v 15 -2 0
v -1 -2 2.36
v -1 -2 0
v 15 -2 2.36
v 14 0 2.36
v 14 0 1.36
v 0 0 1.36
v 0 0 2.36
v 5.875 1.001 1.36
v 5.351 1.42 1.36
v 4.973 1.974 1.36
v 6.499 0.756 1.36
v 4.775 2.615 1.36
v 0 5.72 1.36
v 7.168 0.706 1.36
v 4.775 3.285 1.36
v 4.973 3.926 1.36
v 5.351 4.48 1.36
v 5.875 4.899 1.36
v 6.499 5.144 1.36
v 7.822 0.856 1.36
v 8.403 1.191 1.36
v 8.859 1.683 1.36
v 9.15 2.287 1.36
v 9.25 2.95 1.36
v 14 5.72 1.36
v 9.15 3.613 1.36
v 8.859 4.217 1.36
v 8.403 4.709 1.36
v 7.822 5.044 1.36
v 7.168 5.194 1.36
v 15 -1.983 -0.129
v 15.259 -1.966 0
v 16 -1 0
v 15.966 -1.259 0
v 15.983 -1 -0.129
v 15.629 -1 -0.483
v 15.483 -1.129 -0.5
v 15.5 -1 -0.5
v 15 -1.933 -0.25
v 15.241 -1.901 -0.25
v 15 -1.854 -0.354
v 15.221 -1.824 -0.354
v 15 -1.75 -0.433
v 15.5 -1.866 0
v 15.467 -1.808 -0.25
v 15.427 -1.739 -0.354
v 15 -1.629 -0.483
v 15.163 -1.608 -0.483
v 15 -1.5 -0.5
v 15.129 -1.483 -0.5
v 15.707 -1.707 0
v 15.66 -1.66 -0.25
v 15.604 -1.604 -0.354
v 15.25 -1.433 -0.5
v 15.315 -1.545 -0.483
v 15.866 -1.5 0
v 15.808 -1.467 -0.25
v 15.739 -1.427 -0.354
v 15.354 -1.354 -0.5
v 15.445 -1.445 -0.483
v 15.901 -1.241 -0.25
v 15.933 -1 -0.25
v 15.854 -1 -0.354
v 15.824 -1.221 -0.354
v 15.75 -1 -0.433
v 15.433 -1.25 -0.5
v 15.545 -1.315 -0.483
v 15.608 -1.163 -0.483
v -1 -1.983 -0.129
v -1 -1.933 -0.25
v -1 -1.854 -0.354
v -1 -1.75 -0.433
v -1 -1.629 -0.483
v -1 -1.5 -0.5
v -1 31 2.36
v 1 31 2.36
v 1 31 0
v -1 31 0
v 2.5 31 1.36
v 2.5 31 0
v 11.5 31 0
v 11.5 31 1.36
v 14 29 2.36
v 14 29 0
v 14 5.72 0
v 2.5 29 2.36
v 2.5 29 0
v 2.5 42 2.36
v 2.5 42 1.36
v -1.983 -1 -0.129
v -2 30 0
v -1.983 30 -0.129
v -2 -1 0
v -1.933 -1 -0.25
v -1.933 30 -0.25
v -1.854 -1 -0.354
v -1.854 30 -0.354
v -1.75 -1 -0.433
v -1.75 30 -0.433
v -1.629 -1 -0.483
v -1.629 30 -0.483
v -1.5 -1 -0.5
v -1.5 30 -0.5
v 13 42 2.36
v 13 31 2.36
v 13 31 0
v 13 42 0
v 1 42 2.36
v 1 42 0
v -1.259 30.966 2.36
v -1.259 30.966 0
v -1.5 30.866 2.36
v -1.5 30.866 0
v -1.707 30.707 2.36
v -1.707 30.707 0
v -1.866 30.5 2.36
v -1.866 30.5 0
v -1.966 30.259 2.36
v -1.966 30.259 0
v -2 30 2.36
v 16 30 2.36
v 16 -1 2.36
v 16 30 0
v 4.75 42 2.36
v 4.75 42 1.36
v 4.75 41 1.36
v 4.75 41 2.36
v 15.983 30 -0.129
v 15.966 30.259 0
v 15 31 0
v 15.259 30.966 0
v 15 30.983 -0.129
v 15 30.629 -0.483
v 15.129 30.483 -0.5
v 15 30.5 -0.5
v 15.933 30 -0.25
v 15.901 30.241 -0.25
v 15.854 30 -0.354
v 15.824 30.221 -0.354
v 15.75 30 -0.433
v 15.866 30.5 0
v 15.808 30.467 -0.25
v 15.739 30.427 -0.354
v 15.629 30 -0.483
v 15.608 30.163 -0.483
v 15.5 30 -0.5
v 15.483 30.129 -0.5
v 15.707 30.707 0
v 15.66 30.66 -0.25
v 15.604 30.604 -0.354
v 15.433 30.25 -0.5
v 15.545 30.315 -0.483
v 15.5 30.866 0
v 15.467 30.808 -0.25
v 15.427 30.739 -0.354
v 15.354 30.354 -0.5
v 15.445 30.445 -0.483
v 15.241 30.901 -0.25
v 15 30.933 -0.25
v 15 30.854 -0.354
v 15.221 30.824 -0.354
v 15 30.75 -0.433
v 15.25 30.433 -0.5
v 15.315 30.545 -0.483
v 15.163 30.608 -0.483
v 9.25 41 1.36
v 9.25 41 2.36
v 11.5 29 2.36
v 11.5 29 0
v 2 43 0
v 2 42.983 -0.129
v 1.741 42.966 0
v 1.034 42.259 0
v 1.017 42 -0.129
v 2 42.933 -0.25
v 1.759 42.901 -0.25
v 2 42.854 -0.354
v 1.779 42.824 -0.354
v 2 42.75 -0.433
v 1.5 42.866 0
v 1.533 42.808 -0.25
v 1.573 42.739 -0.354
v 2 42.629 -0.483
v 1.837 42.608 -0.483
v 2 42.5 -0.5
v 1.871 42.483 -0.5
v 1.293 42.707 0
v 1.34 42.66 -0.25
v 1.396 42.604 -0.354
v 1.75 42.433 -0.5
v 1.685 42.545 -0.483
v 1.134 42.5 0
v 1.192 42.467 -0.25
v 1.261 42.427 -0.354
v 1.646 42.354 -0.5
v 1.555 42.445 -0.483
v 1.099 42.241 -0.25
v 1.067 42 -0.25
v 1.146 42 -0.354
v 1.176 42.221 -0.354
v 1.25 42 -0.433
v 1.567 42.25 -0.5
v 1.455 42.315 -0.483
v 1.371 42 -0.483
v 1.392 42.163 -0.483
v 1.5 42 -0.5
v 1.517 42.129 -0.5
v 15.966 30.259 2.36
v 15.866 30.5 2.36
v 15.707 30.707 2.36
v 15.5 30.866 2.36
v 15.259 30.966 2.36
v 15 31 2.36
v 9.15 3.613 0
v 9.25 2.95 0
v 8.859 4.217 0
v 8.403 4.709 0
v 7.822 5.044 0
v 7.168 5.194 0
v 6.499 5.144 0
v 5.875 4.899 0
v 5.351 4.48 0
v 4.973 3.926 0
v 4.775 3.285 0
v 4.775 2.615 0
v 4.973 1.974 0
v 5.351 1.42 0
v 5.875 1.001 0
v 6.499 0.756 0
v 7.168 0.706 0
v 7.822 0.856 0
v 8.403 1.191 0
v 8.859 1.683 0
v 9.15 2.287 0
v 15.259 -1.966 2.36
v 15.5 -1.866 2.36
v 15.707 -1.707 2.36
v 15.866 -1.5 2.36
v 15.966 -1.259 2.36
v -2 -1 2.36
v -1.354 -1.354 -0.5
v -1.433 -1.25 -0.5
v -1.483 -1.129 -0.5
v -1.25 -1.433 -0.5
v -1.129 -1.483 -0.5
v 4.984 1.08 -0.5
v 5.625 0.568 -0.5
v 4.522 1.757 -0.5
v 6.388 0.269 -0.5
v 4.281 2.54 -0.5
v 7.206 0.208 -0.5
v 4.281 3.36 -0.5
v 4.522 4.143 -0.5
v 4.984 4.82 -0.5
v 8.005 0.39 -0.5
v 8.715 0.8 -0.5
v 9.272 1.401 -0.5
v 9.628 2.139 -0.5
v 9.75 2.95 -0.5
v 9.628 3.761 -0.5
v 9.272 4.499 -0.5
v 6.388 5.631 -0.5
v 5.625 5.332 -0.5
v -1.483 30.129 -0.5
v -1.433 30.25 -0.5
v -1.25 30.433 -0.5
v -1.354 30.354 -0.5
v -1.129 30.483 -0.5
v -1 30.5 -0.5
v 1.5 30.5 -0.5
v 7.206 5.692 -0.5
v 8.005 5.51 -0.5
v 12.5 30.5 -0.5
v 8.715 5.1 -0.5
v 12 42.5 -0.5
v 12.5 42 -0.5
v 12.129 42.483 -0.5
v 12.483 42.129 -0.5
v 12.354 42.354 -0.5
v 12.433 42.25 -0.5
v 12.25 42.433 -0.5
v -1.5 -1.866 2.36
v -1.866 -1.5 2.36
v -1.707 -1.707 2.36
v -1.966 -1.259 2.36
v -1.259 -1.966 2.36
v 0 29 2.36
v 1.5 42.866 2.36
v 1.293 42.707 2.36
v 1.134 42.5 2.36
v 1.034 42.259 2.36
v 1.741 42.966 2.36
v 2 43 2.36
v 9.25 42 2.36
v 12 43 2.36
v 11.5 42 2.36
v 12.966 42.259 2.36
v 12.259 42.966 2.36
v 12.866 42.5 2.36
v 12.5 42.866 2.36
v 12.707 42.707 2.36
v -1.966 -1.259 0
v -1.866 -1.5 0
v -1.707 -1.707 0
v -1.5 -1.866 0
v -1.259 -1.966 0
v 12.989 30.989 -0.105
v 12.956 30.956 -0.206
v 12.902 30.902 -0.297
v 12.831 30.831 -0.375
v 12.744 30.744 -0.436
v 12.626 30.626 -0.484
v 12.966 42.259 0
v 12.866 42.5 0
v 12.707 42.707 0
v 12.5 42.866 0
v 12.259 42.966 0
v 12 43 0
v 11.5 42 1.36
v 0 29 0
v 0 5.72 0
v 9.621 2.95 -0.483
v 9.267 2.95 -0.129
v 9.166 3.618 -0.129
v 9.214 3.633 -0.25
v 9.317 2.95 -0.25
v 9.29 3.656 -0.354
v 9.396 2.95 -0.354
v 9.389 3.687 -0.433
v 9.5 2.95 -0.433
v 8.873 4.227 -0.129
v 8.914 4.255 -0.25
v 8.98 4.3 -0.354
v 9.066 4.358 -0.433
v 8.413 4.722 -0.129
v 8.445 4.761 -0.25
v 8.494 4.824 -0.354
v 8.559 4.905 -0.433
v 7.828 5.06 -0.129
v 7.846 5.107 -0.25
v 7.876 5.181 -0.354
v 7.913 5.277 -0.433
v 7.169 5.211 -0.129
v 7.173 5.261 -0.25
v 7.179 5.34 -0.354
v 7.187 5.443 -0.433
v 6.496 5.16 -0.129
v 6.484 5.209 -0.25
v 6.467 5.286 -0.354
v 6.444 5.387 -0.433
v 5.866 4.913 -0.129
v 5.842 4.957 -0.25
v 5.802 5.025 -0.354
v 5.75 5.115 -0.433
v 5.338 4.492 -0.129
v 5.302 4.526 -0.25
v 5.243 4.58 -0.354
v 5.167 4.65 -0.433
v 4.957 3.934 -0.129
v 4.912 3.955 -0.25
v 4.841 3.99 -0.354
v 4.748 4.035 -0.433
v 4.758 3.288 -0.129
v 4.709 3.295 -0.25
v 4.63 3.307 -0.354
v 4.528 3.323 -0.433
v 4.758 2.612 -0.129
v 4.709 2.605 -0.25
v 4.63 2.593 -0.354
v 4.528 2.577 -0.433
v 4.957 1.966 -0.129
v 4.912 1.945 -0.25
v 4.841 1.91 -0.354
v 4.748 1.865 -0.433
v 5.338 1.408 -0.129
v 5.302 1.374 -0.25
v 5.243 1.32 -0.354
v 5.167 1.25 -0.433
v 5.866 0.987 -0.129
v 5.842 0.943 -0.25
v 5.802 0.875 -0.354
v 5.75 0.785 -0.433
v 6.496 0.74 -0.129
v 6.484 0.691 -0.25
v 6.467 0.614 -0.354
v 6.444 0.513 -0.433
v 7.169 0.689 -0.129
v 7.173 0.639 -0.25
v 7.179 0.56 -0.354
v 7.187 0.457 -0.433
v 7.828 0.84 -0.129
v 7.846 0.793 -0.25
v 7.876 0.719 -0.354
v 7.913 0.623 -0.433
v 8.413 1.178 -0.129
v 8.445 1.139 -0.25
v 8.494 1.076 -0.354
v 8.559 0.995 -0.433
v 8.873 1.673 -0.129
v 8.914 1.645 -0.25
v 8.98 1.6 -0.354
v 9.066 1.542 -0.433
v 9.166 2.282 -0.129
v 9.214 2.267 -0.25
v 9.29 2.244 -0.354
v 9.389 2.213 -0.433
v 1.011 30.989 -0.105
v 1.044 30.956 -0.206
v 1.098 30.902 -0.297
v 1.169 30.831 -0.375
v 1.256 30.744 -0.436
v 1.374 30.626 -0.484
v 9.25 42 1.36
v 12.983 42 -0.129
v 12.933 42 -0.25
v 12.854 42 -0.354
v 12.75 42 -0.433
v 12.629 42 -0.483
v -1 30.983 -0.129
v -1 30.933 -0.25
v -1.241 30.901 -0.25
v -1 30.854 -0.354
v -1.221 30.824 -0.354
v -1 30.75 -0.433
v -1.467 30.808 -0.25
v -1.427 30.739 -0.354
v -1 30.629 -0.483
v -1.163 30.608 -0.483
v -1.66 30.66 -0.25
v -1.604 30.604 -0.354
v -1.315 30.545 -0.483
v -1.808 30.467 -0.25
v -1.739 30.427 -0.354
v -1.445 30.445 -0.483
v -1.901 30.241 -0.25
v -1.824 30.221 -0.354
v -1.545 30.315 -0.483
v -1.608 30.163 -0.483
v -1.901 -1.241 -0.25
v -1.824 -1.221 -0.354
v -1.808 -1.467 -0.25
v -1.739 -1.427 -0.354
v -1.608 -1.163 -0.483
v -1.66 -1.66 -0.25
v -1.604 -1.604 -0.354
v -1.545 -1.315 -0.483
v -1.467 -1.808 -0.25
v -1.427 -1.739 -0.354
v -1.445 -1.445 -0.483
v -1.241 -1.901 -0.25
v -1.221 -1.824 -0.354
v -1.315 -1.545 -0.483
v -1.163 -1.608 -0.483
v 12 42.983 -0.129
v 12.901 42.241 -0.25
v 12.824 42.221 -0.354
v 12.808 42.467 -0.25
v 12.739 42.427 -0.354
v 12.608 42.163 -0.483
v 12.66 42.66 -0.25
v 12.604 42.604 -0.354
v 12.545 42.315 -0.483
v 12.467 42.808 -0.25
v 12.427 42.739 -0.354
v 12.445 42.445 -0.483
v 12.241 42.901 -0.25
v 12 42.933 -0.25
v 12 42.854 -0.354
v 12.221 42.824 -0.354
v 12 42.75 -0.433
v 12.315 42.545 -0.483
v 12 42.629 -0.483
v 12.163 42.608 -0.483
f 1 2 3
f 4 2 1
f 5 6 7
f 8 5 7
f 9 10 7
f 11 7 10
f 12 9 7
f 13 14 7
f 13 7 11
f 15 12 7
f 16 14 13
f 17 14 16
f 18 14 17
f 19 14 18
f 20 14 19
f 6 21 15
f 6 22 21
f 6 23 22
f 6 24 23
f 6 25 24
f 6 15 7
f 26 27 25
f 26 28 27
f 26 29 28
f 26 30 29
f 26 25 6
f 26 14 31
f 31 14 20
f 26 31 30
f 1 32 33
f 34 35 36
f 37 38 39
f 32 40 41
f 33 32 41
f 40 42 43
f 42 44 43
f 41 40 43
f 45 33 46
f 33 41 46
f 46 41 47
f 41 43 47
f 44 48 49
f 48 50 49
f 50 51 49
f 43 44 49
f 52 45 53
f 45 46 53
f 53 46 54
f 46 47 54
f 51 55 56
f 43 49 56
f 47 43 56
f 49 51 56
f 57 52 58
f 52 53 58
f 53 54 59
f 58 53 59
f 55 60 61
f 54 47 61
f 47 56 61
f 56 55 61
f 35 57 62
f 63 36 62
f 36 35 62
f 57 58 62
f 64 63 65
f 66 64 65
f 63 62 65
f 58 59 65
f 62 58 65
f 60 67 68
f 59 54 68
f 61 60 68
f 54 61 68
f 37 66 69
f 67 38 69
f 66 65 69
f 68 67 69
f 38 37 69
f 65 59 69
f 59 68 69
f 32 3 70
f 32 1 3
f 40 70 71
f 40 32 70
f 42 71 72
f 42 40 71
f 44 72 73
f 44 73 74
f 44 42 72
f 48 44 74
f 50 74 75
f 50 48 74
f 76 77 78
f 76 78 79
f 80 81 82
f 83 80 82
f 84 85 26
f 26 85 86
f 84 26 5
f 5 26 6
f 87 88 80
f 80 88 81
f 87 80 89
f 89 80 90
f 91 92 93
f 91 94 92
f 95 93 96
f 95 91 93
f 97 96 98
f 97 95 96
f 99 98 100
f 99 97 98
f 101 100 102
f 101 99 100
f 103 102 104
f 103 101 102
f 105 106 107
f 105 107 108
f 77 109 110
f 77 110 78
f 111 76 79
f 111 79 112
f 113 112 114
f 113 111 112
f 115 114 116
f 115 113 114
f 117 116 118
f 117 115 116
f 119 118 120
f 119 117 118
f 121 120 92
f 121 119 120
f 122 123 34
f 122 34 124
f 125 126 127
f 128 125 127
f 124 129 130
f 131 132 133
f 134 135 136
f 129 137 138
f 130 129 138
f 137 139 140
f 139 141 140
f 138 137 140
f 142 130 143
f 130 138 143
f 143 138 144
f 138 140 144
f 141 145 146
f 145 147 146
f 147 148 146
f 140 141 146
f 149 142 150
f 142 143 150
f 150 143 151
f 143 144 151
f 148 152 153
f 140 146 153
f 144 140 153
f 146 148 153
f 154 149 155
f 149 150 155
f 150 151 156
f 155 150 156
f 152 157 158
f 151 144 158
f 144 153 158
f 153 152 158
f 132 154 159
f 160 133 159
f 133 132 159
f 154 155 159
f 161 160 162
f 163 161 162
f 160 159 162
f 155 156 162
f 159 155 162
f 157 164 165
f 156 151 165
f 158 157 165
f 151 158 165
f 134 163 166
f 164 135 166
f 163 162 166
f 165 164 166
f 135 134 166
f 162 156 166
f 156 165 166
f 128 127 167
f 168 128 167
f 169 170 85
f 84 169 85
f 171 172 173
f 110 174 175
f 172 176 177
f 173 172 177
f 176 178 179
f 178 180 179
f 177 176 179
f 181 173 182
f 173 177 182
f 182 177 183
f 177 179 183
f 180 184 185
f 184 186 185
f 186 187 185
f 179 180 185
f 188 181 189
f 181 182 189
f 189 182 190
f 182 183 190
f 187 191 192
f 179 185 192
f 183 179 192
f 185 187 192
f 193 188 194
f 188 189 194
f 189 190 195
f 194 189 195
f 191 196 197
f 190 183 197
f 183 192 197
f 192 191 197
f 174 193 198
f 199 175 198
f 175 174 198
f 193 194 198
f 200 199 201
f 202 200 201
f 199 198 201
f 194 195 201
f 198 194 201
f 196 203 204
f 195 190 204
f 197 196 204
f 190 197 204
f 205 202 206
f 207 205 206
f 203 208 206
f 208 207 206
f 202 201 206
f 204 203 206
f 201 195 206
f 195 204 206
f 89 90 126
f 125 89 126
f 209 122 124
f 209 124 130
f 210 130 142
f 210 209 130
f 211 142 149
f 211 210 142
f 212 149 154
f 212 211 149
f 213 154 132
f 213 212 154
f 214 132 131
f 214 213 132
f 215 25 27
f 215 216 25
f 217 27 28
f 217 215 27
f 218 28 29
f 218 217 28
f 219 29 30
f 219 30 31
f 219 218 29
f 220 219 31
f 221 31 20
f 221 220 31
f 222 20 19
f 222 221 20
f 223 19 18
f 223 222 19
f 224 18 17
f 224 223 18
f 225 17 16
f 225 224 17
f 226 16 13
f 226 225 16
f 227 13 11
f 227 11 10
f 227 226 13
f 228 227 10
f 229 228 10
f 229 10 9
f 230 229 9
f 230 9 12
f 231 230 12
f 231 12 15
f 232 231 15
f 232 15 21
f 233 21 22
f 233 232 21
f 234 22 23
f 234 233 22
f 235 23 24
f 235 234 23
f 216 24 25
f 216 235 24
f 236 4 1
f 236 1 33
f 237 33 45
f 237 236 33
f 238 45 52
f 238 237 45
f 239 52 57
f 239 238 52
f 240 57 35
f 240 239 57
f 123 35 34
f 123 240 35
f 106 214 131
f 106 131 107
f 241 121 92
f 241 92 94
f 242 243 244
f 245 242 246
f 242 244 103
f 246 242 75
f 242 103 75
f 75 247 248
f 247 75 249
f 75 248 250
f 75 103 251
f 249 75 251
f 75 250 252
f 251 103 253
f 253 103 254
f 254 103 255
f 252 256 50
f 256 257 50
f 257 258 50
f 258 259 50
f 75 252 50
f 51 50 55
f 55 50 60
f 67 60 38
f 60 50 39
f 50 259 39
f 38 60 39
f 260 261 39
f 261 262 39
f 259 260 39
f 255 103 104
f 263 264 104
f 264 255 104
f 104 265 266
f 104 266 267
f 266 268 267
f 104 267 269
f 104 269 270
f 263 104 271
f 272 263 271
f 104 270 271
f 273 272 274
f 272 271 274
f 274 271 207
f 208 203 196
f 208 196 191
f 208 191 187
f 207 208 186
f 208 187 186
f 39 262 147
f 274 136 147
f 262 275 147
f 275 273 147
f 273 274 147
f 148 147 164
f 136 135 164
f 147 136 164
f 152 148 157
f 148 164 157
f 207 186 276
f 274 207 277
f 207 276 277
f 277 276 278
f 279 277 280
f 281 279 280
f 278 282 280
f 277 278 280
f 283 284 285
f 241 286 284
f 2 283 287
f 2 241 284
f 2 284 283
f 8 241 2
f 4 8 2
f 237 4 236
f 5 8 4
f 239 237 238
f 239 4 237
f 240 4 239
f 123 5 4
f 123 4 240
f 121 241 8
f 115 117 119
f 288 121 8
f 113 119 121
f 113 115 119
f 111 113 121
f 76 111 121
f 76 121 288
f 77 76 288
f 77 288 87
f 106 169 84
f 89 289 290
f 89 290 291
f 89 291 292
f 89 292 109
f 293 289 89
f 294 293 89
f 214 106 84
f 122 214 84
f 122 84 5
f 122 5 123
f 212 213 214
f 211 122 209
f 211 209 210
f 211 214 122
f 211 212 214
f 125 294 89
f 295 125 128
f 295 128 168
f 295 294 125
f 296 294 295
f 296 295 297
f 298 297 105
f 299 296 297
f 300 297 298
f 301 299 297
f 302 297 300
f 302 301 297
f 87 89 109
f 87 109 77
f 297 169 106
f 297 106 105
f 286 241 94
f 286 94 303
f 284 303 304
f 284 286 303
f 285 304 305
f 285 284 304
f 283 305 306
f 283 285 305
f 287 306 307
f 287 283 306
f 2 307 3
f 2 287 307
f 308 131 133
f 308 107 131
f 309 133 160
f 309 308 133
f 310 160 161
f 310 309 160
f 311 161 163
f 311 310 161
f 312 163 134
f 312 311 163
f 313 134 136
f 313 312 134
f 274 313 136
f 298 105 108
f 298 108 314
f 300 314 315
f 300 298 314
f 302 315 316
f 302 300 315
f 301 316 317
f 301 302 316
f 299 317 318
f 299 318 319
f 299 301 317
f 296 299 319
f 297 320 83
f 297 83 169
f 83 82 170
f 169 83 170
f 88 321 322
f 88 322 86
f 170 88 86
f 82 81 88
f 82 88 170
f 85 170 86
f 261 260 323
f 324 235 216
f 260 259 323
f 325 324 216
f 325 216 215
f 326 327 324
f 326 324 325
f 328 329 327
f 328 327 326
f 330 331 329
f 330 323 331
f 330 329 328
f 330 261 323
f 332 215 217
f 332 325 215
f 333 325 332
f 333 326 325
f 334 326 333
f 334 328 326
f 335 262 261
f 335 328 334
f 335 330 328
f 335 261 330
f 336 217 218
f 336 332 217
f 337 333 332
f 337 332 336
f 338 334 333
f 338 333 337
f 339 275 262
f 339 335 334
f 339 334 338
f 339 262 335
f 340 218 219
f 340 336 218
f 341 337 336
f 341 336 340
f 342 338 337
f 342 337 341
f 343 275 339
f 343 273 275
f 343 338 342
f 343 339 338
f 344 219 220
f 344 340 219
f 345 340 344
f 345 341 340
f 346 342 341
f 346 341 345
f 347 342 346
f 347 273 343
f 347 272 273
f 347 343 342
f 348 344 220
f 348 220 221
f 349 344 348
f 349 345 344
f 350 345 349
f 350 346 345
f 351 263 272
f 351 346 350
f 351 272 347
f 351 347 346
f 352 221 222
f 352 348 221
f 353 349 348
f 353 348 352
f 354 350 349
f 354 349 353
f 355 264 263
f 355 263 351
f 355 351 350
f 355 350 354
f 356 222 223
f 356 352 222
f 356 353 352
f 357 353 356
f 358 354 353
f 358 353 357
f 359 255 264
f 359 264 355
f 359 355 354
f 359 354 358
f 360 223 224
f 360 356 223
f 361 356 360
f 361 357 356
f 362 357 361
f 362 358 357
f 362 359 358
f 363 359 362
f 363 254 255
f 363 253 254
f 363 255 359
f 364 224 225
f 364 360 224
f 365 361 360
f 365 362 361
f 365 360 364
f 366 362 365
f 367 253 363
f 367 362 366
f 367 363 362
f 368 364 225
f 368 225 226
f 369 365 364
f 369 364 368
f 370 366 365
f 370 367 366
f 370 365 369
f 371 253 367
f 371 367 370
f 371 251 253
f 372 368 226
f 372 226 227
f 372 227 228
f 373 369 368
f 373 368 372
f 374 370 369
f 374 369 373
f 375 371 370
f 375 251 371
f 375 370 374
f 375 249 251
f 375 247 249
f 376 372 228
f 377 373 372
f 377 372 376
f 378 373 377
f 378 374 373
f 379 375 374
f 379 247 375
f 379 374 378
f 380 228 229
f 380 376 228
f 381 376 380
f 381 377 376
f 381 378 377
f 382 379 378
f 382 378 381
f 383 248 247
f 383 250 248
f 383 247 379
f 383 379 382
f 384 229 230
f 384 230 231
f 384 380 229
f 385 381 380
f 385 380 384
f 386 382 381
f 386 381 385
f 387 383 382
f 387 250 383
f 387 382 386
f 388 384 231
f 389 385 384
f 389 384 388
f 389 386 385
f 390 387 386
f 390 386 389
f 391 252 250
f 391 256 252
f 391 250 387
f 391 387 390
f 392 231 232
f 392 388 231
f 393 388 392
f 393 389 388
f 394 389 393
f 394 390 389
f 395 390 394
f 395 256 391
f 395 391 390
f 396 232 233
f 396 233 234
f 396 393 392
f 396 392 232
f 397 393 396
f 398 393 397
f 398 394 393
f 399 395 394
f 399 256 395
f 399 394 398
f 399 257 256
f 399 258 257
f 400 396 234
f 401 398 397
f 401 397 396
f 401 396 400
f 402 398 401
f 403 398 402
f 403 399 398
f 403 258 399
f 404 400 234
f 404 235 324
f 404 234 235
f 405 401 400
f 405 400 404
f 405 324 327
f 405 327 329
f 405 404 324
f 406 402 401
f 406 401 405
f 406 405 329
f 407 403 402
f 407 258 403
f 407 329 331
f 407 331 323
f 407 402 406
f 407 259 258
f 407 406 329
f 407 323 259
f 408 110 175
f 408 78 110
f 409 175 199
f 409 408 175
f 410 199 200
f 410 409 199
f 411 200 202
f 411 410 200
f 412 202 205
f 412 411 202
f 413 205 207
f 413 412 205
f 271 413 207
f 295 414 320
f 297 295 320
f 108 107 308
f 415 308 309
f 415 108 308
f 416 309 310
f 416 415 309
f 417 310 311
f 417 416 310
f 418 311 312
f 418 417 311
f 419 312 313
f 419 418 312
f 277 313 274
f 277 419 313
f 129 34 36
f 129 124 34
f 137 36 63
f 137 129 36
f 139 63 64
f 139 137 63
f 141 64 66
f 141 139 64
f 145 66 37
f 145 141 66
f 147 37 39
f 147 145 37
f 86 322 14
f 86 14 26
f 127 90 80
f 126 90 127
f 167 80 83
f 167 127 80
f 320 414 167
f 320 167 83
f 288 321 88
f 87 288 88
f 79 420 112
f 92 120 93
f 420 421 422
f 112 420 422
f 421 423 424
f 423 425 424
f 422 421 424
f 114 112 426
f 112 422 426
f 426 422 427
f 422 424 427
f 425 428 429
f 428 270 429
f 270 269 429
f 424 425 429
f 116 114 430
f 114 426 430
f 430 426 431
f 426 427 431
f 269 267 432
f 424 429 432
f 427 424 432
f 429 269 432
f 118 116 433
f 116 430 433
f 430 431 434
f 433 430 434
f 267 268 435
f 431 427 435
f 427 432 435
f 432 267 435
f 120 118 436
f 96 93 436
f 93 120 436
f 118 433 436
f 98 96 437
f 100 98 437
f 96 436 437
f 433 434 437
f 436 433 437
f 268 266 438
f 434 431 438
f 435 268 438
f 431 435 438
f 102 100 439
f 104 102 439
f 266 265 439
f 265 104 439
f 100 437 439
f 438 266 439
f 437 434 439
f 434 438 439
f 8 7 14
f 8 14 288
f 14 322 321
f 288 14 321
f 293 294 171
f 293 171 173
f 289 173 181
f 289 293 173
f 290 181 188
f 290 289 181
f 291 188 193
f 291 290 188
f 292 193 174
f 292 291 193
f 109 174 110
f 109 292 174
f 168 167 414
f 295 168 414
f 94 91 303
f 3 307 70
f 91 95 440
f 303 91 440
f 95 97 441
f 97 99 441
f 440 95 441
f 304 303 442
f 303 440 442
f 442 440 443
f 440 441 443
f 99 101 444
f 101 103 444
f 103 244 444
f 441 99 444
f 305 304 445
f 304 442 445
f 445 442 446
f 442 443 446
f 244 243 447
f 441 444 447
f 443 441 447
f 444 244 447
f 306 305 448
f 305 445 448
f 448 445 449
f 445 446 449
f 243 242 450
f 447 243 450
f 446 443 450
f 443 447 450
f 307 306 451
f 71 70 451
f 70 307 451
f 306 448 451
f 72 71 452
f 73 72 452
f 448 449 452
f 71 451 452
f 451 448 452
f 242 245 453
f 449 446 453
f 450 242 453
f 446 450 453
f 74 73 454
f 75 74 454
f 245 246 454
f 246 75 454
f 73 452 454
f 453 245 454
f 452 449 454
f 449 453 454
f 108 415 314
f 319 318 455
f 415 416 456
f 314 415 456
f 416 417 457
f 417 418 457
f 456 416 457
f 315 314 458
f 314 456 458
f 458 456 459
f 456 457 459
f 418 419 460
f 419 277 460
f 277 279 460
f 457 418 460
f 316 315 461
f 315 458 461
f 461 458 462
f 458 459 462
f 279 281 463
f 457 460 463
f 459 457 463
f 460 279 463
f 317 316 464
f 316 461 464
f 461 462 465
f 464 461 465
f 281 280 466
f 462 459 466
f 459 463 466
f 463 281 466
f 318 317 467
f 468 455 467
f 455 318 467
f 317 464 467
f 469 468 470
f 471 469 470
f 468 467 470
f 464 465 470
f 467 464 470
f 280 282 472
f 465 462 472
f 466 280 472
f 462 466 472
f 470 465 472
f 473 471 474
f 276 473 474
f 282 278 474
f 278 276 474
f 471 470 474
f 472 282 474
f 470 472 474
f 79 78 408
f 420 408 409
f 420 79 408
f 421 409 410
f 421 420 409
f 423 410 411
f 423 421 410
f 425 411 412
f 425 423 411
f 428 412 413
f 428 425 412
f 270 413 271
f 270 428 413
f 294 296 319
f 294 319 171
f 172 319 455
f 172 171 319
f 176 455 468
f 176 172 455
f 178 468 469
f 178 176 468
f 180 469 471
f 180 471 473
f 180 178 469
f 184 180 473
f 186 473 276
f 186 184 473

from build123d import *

# Parameters (mm, degrees)
F1_DEPTH = 2.36
F0_W     = 14
F0_H     = 5.7202167809
F0_R     = 2.25
F0_R_2   = 4.5
F2_DEPTH = 0.5
F3_R     = 0.49999
F4_DEPTH = 1.36
F5_DEPTH = 1.36


# Not quite as in the source:
# - a fillet or chamfer is up to 0.001 mm smaller than in the source, because OpenCascade refuses the exact size


with BuildPart() as f1:
    # F0 (on Top) → F1 (new body)
    with BuildSketch(Plane.XY):
        with BuildLine():
            ThreePointArc((-2, -1), (-1.7071067812, -1.7071067812), (-1, -2))
            Line((-1, -2), (15, -2))
            ThreePointArc((15, -2), (15.7071067812, -1.7071067812), (16, -1))
            Line((16, -1), (16, 30))
            ThreePointArc((16, 30), (15.7071067812, 30.7071067812), (15, 31))
            Line((15, 31), (13, 31))
            Line((13, 31), (13, 42))
            ThreePointArc((13, 42), (12.7071067812, 42.7071067812), (12, 43))
            Line((12, 43), (2, 43))
            ThreePointArc((2, 43), (1.2928932188, 42.7071067812), (1, 42))
            Line((1, 42), (1, 31))
            Line((1, 31), (-1, 31))
            ThreePointArc((-1, 31), (-1.7071067812, 30.7071067812), (-2, 30))
            Line((-2, 30), (-2, -1))
        make_face()
        Polygon((14, 0), (0, 0), (0, 5.7202167809), (0, 29), (2.5, 29), (2.5, 31), (2.5, 42), (4.75, 42), (4.75, 41), (9.25, 41), (9.25, 42), (11.5, 42), (11.5, 31), (11.5, 29), (14, 29), (14, 5.7202167809), align=None, mode=Mode.SUBTRACT)
    extrude(amount=F1_DEPTH)

    # F0 (on Top) → F2 (join)
    with BuildSketch(Plane.XY):
        with BuildLine():
            ThreePointArc((-2, -1), (-1.7071067812, -1.7071067812), (-1, -2))
            Line((-1, -2), (15, -2))
            ThreePointArc((15, -2), (15.7071067812, -1.7071067812), (16, -1))
            Line((16, -1), (16, 30))
            ThreePointArc((16, 30), (15.7071067812, 30.7071067812), (15, 31))
            Line((15, 31), (13, 31))
            Line((13, 31), (13, 42))
            ThreePointArc((13, 42), (12.7071067812, 42.7071067812), (12, 43))
            Line((12, 43), (2, 43))
            ThreePointArc((2, 43), (1.2928932188, 42.7071067812), (1, 42))
            Line((1, 42), (1, 31))
            Line((1, 31), (-1, 31))
            ThreePointArc((-1, 31), (-1.7071067812, 30.7071067812), (-2, 30))
            Line((-2, 30), (-2, -1))
        make_face()
        Polygon((14, 0), (0, 0), (0, 5.7202167809), (0, 29), (2.5, 29), (2.5, 31), (2.5, 42), (4.75, 42), (4.75, 41), (9.25, 41), (9.25, 42), (11.5, 42), (11.5, 31), (11.5, 29), (14, 29), (14, 5.7202167809), align=None, mode=Mode.SUBTRACT)
        with Locations((7, 2.8601083905)):
            Rectangle(F0_W, F0_H)
        with Locations((7, 2.95)):
            Circle(F0_R, mode=Mode.SUBTRACT)
        Polygon((2.5, 42), (2.5, 31), (11.5, 31), (11.5, 42), (9.25, 42), (9.25, 41), (4.75, 41), (4.75, 42), align=None)
        Polygon((0, 29), (0, 5.7202167809), (14, 5.7202167809), (14, 29), (11.5, 29), (11.5, 31), (2.5, 31), (2.5, 29), align=None)
        with Locations((7, 18.8)):
            Circle(F0_R_2, mode=Mode.SUBTRACT)
        with Locations((7, 18.8)):
            Circle(F0_R_2)
    extrude(amount=-F2_DEPTH)

    # F3 (radius 0.5 in the source; OpenCascade refuses exactly that, so slightly less here)
    f3_edges = [f1.edges().sort_by_distance(p)[0] for p in [
        (1, 36.5, -0.5),
        (0, 31, -0.5),
        (-1.707107, 30.707107, -0.5),
        (-2, 14.5, -0.5),
        (-1.707107, -1.707107, -0.5),
        (7, -2, -0.5),
        (15.707107, -1.707107, -0.5),
        (16, 14.5, -0.5),
        (15.707107, 30.707107, -0.5),
        (14, 31, -0.5),
        (13, 36.5, -0.5),
        (12.707107, 42.707107, -0.5),
        (7, 43, -0.5),
        (1.292893, 42.707107, -0.5),
        (4.75, 2.95, -0.5),
    ]]
    fillet(f3_edges, radius=F3_R)

    # F0 (on Top) → F4 (join)
    with BuildSketch(Plane.XY):
        Polygon((2.5, 42), (2.5, 31), (11.5, 31), (11.5, 42), (9.25, 42), (9.25, 41), (4.75, 41), (4.75, 42), align=None)
    extrude(amount=F4_DEPTH)

    # F0 (on Top) → F5 (join)
    with BuildSketch(Plane.XY):
        with Locations((7, 2.8601083905)):
            Rectangle(F0_W, F0_H)
        with Locations((7, 2.95)):
            Circle(F0_R, mode=Mode.SUBTRACT)
    extrude(amount=F5_DEPTH)


solid = f1.part
